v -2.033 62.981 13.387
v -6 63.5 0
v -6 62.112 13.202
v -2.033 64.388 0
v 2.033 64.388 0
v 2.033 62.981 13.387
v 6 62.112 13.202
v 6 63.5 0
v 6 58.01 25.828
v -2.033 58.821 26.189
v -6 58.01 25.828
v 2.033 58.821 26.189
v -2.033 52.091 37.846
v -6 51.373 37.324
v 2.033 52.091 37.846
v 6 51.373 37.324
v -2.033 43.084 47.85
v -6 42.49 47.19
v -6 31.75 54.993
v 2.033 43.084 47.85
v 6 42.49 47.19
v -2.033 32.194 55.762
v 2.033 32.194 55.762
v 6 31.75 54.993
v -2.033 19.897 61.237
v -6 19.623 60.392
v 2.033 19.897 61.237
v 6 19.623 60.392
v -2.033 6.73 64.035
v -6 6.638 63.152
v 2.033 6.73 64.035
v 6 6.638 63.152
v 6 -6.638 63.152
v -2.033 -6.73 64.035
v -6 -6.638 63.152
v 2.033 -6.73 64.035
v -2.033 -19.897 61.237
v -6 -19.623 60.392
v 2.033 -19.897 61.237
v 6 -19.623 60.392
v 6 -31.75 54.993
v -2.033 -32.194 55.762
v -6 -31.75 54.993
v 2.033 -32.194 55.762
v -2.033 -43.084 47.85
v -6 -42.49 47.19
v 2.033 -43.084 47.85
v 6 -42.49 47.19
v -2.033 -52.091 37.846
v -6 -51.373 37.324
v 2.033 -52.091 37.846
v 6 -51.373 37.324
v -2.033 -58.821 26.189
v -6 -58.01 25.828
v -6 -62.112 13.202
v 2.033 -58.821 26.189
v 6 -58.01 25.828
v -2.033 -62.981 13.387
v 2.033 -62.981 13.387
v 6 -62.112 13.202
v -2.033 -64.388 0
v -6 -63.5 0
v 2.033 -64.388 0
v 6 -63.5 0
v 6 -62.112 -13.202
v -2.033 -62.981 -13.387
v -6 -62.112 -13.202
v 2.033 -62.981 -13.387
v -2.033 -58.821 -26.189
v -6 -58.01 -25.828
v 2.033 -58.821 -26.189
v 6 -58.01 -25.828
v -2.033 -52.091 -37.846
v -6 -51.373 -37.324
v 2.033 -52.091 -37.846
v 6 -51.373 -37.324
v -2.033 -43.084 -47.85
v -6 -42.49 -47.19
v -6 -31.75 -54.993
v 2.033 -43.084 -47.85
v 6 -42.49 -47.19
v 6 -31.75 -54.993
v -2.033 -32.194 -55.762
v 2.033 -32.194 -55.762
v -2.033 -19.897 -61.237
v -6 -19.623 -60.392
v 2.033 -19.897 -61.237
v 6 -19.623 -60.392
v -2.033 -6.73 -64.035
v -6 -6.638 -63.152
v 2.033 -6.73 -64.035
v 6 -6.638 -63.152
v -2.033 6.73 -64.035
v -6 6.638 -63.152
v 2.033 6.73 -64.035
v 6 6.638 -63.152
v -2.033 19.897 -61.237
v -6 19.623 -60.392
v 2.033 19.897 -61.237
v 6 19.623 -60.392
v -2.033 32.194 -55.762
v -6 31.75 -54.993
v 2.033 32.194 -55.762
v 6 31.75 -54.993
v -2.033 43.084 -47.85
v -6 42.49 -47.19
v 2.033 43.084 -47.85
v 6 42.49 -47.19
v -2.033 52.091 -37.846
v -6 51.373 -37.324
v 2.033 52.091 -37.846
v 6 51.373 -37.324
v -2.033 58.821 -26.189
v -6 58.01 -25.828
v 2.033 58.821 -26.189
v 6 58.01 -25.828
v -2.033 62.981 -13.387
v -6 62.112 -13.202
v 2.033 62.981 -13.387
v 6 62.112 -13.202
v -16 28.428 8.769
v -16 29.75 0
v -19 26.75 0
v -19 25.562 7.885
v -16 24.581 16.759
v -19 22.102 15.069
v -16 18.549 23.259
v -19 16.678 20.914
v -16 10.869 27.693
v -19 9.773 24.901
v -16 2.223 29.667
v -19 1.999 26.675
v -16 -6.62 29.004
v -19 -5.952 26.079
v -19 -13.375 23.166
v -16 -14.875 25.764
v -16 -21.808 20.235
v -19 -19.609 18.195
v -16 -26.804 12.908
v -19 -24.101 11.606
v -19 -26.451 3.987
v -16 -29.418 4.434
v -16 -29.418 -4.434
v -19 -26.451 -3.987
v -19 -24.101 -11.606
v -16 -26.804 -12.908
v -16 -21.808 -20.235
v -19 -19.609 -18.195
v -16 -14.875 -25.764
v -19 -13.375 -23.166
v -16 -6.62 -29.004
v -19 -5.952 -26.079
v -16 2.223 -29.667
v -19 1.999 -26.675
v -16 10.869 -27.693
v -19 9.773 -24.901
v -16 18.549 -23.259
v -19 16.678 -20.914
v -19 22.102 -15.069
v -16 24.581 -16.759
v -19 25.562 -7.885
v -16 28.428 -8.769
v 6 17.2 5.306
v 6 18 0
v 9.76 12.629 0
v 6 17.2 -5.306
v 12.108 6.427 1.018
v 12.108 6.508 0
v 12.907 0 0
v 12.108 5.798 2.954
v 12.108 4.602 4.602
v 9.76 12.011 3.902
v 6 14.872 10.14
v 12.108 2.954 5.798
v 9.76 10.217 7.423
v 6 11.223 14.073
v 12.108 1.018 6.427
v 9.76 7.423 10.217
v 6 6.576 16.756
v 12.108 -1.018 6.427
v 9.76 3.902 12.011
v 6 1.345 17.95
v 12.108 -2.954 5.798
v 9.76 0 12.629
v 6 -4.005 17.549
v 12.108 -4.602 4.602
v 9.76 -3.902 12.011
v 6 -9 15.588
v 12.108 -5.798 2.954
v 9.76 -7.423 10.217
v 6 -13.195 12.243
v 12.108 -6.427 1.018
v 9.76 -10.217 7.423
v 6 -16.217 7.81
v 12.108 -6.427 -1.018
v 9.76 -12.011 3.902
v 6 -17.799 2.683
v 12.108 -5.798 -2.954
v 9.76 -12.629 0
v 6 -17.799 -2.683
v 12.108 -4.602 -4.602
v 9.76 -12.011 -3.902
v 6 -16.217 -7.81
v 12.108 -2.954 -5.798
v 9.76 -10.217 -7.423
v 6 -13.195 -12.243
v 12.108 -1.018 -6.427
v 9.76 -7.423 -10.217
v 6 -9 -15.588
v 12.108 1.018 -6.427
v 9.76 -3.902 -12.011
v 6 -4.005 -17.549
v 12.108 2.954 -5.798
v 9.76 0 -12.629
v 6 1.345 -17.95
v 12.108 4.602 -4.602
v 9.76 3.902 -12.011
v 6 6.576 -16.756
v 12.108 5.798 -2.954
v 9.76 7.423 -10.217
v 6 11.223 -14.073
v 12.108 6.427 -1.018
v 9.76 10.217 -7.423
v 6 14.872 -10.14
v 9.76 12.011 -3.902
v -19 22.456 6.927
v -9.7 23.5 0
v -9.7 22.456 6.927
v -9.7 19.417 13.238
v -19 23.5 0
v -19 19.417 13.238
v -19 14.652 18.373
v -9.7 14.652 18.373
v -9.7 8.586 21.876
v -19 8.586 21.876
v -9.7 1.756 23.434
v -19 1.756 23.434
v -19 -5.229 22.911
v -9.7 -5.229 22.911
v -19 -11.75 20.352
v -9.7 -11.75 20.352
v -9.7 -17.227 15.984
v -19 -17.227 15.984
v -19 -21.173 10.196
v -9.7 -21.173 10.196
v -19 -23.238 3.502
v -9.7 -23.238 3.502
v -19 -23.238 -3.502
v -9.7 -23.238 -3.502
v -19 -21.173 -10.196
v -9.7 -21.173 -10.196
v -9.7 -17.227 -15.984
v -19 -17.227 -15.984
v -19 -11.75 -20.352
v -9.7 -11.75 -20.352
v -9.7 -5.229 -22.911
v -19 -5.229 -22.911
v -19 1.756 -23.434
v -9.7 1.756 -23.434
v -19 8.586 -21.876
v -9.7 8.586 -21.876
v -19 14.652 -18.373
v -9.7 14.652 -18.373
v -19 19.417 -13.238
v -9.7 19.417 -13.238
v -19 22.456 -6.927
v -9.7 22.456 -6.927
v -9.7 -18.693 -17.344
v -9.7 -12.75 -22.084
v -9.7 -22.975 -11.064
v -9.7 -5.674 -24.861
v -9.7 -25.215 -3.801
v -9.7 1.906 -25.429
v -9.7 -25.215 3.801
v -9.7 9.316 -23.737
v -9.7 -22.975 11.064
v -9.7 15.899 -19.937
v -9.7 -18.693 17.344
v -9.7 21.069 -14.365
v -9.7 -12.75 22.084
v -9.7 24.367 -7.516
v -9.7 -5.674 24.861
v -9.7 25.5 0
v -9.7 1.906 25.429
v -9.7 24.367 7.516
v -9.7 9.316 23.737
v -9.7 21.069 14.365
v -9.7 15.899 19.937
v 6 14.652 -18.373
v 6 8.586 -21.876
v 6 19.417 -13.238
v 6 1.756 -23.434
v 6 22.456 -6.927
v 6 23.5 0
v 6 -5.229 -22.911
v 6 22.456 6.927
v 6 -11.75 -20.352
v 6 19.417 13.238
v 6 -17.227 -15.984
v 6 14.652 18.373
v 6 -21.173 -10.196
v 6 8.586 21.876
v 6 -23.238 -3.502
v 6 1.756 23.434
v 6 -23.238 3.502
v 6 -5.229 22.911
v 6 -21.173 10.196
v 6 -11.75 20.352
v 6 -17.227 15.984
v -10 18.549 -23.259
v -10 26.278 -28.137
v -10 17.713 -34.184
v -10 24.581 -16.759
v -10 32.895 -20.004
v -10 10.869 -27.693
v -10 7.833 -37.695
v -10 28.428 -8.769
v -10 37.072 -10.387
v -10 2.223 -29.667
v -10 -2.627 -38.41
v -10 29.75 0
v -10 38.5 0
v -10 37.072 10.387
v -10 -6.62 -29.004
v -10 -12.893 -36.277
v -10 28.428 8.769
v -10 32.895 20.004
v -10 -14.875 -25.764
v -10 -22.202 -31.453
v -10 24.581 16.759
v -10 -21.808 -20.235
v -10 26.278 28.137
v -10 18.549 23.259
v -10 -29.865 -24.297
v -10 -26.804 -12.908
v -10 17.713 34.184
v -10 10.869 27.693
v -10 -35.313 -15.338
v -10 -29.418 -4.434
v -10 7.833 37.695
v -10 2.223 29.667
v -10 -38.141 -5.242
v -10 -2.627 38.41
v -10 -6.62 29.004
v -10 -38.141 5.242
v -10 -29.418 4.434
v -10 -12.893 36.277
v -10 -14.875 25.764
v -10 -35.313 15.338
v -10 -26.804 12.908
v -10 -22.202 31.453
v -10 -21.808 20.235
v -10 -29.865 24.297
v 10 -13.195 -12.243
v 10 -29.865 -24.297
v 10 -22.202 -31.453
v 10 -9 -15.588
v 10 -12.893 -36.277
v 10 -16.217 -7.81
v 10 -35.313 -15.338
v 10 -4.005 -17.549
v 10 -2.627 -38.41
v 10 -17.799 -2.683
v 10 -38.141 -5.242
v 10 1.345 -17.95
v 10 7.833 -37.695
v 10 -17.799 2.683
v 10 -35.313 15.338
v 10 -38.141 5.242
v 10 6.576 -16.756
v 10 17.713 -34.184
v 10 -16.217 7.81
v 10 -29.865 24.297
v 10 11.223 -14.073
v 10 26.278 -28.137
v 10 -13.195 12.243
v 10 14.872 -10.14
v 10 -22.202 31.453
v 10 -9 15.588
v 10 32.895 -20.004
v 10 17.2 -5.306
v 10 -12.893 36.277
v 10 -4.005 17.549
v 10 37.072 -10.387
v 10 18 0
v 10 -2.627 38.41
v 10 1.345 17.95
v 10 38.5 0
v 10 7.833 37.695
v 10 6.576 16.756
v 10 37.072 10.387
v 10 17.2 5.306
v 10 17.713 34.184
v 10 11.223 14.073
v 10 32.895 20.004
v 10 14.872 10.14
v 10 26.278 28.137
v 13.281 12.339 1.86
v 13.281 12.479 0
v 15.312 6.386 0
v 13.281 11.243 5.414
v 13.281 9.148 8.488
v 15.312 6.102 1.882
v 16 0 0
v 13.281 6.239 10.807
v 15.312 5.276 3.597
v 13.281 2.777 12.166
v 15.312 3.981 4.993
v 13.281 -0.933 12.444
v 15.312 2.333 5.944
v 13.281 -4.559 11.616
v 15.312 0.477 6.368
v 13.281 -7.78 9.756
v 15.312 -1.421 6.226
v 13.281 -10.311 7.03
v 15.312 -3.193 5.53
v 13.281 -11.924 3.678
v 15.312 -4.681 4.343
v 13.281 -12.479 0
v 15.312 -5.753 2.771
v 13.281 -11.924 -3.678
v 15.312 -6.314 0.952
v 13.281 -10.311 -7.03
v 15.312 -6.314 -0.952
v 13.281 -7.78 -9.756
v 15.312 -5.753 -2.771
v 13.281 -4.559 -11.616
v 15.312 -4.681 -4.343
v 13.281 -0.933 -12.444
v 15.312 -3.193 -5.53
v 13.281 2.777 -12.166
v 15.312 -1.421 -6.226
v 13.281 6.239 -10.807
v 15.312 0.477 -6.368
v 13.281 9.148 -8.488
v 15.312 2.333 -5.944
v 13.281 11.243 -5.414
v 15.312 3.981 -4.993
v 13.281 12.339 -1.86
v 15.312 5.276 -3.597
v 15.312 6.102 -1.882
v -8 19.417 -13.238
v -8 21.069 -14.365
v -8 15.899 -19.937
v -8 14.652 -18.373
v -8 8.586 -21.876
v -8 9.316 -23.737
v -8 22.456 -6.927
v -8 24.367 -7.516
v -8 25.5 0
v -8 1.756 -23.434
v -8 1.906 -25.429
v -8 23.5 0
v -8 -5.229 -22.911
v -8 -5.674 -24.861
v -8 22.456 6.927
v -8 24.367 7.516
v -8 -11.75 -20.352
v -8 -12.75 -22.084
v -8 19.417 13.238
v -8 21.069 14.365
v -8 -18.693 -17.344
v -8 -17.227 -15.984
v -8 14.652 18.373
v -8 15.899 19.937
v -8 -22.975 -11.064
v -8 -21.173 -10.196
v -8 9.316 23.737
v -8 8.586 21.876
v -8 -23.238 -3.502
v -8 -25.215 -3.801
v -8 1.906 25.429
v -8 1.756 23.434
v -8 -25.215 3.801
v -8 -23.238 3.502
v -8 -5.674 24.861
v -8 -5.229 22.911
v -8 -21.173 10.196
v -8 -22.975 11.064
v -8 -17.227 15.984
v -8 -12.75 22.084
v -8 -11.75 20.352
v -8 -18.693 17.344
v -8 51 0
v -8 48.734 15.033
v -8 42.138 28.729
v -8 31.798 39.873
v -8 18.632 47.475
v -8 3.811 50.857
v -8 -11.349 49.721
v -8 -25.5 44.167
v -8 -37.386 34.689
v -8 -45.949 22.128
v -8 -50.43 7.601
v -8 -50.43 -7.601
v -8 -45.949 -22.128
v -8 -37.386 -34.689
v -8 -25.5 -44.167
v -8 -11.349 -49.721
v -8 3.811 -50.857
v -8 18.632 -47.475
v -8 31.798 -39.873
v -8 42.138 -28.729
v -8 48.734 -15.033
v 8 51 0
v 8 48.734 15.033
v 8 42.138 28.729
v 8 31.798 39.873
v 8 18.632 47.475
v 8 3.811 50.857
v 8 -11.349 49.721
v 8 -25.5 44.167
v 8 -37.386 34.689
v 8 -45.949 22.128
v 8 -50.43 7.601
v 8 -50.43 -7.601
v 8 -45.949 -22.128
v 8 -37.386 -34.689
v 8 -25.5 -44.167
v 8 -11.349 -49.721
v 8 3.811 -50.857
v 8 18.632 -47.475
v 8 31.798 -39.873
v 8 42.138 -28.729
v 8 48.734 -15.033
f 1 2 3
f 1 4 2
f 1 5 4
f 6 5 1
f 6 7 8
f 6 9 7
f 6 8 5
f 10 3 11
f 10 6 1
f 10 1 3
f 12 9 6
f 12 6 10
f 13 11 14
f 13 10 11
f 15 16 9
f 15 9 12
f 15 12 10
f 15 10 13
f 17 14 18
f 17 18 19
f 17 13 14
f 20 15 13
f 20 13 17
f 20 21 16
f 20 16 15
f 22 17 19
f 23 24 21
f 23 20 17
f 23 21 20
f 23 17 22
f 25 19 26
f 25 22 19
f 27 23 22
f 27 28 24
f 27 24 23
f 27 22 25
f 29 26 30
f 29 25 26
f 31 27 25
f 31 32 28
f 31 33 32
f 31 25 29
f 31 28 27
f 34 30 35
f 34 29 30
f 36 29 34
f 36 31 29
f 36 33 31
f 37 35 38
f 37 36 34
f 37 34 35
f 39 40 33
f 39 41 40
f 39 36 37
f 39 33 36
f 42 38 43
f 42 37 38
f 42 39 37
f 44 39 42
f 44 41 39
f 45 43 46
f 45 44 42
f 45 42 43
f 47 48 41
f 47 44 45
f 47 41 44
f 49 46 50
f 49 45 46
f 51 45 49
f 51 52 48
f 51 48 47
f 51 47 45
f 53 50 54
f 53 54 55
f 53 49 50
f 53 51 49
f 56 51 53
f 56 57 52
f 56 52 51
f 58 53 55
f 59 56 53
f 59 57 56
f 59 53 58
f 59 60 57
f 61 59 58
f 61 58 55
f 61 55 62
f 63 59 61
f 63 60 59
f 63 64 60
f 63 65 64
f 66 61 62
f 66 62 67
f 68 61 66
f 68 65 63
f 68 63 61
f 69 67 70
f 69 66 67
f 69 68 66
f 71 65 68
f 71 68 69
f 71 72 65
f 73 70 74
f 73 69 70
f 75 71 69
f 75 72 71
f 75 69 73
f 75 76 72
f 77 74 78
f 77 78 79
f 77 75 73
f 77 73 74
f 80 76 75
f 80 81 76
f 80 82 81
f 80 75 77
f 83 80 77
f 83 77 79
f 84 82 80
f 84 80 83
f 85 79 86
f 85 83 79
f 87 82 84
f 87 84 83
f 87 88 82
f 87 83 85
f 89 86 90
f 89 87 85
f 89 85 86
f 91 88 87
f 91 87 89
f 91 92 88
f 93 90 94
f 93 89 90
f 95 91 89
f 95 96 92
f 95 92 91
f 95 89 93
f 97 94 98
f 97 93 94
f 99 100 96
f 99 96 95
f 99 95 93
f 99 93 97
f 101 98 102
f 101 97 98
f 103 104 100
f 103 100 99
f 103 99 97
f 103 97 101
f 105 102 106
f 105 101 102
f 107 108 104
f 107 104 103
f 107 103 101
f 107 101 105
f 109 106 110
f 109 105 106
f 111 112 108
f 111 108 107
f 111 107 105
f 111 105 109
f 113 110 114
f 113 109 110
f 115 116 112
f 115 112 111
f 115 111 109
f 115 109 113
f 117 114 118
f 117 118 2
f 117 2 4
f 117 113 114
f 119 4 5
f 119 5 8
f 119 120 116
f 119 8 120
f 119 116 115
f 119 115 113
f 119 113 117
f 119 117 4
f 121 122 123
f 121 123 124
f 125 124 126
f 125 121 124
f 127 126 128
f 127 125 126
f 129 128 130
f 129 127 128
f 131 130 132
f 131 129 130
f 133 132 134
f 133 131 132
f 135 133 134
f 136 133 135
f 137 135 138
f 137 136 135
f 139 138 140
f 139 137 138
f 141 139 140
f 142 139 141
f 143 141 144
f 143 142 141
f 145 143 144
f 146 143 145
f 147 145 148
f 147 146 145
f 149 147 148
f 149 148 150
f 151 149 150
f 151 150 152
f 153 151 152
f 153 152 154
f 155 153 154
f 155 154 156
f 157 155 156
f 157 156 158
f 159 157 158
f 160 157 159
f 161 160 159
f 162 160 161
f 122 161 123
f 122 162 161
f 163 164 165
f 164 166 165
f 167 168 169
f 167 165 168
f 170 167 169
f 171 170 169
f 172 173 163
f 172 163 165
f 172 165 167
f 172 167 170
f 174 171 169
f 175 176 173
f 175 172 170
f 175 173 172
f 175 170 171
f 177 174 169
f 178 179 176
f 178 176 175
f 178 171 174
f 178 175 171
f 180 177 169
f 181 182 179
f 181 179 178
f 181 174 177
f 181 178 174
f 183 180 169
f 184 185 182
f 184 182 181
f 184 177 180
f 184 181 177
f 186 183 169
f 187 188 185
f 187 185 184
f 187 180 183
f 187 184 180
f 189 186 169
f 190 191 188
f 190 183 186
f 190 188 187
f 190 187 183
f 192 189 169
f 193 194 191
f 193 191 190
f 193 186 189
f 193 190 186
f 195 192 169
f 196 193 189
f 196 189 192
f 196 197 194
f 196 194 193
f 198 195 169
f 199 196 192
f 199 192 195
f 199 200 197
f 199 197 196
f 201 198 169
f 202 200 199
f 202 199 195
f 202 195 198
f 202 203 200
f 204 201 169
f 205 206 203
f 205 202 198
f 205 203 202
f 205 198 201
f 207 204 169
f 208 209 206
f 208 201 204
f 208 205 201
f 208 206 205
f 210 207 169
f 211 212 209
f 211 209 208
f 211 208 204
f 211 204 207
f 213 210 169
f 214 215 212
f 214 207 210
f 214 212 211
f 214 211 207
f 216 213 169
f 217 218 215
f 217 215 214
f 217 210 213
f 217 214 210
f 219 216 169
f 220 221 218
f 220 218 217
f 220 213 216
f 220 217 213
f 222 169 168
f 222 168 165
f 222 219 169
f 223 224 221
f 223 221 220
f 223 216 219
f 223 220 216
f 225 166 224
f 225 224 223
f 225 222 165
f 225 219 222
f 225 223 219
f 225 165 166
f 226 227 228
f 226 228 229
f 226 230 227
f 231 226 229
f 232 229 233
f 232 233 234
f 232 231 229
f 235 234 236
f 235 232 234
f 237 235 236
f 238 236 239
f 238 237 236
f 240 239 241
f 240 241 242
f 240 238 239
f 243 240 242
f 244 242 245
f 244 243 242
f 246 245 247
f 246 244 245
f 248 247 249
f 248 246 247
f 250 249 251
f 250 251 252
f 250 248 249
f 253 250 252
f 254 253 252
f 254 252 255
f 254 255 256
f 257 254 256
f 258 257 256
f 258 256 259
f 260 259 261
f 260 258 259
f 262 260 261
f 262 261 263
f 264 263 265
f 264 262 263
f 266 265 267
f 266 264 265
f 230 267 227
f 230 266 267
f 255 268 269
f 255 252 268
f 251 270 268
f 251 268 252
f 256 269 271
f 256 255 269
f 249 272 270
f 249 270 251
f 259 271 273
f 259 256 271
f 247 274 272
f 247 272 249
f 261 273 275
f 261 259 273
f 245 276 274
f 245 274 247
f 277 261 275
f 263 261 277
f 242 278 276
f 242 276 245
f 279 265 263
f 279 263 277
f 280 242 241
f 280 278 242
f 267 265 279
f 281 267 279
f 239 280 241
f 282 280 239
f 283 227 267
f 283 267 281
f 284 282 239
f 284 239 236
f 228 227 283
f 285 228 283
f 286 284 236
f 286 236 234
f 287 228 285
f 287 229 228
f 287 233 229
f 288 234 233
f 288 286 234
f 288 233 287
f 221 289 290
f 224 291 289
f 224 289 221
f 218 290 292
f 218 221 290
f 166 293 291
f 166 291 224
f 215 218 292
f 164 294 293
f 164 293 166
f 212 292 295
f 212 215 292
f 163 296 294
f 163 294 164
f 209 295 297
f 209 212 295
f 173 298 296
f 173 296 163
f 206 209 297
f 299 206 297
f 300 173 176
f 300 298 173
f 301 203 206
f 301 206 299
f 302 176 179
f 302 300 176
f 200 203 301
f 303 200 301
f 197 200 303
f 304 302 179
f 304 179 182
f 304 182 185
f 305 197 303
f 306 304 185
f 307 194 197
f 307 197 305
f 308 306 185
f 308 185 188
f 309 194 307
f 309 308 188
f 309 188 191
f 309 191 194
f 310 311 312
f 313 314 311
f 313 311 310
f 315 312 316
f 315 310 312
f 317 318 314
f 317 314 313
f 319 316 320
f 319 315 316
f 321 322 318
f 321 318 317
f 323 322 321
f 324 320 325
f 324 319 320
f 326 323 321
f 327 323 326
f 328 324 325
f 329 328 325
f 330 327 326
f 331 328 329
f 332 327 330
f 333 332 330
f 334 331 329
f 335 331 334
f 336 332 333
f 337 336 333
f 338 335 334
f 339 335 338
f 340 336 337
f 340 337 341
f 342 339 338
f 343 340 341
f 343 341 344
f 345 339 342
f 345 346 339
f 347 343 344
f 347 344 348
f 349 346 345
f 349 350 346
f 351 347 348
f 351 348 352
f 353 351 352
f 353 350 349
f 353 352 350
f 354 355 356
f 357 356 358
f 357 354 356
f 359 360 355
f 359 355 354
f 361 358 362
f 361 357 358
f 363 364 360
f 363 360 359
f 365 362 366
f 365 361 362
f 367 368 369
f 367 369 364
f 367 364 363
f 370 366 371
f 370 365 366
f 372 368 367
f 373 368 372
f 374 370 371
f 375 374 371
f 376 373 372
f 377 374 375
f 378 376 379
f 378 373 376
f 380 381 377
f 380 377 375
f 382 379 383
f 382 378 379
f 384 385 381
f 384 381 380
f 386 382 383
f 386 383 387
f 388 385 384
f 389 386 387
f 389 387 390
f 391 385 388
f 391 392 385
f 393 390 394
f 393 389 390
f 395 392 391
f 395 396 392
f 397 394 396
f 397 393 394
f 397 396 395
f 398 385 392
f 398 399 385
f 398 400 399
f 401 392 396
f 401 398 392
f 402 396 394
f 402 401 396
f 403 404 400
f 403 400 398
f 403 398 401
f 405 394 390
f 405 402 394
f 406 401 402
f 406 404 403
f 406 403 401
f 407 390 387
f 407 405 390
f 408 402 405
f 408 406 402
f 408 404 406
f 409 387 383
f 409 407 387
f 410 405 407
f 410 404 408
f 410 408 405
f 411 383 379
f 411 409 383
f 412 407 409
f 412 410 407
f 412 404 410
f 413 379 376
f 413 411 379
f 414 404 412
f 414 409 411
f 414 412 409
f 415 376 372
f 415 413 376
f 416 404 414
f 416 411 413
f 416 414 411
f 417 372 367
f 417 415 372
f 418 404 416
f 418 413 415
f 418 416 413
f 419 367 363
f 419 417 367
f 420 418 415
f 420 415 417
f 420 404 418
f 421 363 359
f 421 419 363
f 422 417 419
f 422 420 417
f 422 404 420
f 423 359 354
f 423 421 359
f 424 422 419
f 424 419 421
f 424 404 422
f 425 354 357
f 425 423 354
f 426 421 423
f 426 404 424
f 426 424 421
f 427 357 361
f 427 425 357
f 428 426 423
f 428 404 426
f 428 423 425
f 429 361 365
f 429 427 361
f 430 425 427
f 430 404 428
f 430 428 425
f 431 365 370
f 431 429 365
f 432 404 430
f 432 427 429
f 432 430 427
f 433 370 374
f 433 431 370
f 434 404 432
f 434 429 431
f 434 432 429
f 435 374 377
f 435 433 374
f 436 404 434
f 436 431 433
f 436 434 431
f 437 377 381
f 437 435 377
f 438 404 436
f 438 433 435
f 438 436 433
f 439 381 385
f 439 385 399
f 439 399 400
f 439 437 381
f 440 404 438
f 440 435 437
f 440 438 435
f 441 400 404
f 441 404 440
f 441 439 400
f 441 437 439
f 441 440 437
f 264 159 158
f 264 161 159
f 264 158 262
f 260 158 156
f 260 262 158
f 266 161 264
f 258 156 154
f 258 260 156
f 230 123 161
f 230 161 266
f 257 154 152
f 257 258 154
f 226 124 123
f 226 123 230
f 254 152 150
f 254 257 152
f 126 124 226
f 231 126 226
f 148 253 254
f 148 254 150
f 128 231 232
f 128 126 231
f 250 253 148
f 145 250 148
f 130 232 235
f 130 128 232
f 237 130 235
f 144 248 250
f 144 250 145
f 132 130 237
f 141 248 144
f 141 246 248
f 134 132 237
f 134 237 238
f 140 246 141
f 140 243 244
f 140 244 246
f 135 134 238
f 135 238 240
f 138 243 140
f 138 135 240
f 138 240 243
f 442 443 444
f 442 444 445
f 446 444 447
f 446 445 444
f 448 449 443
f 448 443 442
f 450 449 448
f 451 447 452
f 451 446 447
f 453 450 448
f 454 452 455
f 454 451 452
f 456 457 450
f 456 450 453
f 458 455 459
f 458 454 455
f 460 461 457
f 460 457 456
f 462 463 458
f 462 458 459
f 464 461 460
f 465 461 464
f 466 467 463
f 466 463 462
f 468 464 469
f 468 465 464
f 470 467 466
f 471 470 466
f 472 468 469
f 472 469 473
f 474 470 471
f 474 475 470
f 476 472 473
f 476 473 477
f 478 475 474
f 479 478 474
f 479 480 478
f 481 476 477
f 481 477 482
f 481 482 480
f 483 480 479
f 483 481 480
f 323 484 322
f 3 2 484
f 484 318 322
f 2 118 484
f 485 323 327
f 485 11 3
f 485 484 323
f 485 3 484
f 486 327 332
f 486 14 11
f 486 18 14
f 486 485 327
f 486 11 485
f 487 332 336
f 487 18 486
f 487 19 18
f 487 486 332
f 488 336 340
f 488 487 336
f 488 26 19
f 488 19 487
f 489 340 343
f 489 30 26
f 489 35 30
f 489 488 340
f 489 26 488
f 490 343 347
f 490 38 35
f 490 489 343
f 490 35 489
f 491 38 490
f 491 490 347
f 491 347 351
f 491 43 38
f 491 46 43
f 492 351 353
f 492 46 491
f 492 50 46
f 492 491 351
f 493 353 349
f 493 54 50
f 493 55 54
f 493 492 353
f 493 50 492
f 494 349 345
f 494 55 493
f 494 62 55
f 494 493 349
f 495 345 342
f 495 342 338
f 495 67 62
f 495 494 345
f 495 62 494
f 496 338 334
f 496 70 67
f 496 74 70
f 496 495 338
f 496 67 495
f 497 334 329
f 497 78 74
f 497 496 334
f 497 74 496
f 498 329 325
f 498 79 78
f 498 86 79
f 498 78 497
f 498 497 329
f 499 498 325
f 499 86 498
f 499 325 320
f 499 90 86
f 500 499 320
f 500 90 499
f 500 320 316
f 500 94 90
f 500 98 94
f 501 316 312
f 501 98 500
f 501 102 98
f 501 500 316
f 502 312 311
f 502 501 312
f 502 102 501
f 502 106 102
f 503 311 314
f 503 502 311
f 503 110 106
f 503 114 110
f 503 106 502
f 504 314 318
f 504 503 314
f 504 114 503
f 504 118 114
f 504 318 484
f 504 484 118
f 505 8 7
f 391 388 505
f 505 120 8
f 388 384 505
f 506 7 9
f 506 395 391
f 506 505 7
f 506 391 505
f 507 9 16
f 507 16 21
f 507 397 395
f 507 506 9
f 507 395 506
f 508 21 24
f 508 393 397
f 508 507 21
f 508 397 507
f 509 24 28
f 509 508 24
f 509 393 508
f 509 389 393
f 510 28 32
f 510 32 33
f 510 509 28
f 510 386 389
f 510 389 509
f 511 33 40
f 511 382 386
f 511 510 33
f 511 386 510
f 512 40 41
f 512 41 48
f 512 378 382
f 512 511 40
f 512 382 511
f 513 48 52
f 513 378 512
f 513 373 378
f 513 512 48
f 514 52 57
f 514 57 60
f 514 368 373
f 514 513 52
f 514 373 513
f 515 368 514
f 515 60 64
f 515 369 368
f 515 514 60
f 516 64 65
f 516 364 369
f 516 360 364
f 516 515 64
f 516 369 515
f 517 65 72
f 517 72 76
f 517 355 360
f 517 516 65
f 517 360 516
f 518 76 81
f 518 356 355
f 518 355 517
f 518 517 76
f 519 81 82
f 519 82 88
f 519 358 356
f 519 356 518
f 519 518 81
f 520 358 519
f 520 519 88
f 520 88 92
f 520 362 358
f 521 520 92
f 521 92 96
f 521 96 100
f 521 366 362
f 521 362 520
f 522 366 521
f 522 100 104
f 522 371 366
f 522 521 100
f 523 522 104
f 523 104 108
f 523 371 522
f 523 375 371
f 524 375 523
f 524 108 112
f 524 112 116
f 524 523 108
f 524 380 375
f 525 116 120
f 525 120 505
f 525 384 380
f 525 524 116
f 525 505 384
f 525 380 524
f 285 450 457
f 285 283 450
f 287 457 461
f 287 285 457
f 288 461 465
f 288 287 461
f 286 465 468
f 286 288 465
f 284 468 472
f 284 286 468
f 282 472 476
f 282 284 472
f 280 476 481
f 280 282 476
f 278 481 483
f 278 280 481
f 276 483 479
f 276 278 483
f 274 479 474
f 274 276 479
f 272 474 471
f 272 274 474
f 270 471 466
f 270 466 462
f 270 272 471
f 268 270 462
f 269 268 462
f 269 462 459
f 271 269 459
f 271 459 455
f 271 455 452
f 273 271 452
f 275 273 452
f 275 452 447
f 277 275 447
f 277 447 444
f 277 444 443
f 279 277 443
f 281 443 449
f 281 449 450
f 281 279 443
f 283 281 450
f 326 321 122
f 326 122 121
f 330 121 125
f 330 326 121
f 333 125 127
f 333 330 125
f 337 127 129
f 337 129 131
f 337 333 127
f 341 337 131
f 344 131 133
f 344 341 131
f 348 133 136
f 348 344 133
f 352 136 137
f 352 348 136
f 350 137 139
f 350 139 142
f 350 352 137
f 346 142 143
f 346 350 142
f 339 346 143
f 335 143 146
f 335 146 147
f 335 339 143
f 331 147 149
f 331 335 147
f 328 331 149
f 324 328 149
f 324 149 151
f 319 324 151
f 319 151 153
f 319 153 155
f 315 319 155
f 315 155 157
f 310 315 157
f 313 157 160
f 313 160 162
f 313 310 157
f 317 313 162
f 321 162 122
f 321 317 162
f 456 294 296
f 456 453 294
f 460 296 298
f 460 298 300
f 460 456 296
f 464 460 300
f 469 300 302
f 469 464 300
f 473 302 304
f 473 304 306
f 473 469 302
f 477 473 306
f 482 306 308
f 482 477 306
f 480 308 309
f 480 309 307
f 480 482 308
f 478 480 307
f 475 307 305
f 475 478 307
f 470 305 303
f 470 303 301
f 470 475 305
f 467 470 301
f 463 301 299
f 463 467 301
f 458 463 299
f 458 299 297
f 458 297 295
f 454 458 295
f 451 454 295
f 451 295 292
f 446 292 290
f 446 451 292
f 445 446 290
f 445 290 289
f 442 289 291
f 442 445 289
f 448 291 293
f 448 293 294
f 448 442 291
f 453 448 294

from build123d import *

# Parameters (mm, degrees)
CHAMFER_1_SIZE = 3


with BuildPart() as part:
    # Эскиз1 → Повернуть1 (revolve)
    with BuildSketch(Plane.XY):
        with BuildLine():
            Line((6, 18), (6, 23.5))
            Line((6, 23.5), (-8, 23.5))
            Line((-8, 23.5), (-8, 25.5))
            Line((-8, 25.5), (-9.7, 25.5))
            Line((-9.7, 25.5), (-9.7, 23.5))
            Line((-9.7, 23.5), (-19, 23.5))
            Line((-19, 23.5), (-19, 29.75))
            Line((-19, 29.75), (-10, 29.75))
            Line((-10, 29.75), (-10, 38.5))
            Line((-10, 38.5), (-6, 63.5))
            ThreePointArc((-6, 63.5), (0, 64.5), (6, 63.5))
            Line((6, 63.5), (10, 38.5))
            Line((10, 38.5), (10, 18))
            ThreePointArc((10, 18), (14.460498942, 9.486832981), (16, 0))
            Line((16, 0), (12.907248094, 0))
            ThreePointArc((12.907248094, 0), (11.121156043, 9.639892067), (6, 18))
        make_face()
    revolve(axis=Axis((12.907248094, 0, 0), (1, 0, 0)))

    # Фаска1
    chamfer_1_edges = [part.edges().sort_by_distance(p)[0] for p in [
        (-19, -29.75, 0),
    ]]
    chamfer(chamfer_1_edges, length=CHAMFER_1_SIZE)


solid = part.part
